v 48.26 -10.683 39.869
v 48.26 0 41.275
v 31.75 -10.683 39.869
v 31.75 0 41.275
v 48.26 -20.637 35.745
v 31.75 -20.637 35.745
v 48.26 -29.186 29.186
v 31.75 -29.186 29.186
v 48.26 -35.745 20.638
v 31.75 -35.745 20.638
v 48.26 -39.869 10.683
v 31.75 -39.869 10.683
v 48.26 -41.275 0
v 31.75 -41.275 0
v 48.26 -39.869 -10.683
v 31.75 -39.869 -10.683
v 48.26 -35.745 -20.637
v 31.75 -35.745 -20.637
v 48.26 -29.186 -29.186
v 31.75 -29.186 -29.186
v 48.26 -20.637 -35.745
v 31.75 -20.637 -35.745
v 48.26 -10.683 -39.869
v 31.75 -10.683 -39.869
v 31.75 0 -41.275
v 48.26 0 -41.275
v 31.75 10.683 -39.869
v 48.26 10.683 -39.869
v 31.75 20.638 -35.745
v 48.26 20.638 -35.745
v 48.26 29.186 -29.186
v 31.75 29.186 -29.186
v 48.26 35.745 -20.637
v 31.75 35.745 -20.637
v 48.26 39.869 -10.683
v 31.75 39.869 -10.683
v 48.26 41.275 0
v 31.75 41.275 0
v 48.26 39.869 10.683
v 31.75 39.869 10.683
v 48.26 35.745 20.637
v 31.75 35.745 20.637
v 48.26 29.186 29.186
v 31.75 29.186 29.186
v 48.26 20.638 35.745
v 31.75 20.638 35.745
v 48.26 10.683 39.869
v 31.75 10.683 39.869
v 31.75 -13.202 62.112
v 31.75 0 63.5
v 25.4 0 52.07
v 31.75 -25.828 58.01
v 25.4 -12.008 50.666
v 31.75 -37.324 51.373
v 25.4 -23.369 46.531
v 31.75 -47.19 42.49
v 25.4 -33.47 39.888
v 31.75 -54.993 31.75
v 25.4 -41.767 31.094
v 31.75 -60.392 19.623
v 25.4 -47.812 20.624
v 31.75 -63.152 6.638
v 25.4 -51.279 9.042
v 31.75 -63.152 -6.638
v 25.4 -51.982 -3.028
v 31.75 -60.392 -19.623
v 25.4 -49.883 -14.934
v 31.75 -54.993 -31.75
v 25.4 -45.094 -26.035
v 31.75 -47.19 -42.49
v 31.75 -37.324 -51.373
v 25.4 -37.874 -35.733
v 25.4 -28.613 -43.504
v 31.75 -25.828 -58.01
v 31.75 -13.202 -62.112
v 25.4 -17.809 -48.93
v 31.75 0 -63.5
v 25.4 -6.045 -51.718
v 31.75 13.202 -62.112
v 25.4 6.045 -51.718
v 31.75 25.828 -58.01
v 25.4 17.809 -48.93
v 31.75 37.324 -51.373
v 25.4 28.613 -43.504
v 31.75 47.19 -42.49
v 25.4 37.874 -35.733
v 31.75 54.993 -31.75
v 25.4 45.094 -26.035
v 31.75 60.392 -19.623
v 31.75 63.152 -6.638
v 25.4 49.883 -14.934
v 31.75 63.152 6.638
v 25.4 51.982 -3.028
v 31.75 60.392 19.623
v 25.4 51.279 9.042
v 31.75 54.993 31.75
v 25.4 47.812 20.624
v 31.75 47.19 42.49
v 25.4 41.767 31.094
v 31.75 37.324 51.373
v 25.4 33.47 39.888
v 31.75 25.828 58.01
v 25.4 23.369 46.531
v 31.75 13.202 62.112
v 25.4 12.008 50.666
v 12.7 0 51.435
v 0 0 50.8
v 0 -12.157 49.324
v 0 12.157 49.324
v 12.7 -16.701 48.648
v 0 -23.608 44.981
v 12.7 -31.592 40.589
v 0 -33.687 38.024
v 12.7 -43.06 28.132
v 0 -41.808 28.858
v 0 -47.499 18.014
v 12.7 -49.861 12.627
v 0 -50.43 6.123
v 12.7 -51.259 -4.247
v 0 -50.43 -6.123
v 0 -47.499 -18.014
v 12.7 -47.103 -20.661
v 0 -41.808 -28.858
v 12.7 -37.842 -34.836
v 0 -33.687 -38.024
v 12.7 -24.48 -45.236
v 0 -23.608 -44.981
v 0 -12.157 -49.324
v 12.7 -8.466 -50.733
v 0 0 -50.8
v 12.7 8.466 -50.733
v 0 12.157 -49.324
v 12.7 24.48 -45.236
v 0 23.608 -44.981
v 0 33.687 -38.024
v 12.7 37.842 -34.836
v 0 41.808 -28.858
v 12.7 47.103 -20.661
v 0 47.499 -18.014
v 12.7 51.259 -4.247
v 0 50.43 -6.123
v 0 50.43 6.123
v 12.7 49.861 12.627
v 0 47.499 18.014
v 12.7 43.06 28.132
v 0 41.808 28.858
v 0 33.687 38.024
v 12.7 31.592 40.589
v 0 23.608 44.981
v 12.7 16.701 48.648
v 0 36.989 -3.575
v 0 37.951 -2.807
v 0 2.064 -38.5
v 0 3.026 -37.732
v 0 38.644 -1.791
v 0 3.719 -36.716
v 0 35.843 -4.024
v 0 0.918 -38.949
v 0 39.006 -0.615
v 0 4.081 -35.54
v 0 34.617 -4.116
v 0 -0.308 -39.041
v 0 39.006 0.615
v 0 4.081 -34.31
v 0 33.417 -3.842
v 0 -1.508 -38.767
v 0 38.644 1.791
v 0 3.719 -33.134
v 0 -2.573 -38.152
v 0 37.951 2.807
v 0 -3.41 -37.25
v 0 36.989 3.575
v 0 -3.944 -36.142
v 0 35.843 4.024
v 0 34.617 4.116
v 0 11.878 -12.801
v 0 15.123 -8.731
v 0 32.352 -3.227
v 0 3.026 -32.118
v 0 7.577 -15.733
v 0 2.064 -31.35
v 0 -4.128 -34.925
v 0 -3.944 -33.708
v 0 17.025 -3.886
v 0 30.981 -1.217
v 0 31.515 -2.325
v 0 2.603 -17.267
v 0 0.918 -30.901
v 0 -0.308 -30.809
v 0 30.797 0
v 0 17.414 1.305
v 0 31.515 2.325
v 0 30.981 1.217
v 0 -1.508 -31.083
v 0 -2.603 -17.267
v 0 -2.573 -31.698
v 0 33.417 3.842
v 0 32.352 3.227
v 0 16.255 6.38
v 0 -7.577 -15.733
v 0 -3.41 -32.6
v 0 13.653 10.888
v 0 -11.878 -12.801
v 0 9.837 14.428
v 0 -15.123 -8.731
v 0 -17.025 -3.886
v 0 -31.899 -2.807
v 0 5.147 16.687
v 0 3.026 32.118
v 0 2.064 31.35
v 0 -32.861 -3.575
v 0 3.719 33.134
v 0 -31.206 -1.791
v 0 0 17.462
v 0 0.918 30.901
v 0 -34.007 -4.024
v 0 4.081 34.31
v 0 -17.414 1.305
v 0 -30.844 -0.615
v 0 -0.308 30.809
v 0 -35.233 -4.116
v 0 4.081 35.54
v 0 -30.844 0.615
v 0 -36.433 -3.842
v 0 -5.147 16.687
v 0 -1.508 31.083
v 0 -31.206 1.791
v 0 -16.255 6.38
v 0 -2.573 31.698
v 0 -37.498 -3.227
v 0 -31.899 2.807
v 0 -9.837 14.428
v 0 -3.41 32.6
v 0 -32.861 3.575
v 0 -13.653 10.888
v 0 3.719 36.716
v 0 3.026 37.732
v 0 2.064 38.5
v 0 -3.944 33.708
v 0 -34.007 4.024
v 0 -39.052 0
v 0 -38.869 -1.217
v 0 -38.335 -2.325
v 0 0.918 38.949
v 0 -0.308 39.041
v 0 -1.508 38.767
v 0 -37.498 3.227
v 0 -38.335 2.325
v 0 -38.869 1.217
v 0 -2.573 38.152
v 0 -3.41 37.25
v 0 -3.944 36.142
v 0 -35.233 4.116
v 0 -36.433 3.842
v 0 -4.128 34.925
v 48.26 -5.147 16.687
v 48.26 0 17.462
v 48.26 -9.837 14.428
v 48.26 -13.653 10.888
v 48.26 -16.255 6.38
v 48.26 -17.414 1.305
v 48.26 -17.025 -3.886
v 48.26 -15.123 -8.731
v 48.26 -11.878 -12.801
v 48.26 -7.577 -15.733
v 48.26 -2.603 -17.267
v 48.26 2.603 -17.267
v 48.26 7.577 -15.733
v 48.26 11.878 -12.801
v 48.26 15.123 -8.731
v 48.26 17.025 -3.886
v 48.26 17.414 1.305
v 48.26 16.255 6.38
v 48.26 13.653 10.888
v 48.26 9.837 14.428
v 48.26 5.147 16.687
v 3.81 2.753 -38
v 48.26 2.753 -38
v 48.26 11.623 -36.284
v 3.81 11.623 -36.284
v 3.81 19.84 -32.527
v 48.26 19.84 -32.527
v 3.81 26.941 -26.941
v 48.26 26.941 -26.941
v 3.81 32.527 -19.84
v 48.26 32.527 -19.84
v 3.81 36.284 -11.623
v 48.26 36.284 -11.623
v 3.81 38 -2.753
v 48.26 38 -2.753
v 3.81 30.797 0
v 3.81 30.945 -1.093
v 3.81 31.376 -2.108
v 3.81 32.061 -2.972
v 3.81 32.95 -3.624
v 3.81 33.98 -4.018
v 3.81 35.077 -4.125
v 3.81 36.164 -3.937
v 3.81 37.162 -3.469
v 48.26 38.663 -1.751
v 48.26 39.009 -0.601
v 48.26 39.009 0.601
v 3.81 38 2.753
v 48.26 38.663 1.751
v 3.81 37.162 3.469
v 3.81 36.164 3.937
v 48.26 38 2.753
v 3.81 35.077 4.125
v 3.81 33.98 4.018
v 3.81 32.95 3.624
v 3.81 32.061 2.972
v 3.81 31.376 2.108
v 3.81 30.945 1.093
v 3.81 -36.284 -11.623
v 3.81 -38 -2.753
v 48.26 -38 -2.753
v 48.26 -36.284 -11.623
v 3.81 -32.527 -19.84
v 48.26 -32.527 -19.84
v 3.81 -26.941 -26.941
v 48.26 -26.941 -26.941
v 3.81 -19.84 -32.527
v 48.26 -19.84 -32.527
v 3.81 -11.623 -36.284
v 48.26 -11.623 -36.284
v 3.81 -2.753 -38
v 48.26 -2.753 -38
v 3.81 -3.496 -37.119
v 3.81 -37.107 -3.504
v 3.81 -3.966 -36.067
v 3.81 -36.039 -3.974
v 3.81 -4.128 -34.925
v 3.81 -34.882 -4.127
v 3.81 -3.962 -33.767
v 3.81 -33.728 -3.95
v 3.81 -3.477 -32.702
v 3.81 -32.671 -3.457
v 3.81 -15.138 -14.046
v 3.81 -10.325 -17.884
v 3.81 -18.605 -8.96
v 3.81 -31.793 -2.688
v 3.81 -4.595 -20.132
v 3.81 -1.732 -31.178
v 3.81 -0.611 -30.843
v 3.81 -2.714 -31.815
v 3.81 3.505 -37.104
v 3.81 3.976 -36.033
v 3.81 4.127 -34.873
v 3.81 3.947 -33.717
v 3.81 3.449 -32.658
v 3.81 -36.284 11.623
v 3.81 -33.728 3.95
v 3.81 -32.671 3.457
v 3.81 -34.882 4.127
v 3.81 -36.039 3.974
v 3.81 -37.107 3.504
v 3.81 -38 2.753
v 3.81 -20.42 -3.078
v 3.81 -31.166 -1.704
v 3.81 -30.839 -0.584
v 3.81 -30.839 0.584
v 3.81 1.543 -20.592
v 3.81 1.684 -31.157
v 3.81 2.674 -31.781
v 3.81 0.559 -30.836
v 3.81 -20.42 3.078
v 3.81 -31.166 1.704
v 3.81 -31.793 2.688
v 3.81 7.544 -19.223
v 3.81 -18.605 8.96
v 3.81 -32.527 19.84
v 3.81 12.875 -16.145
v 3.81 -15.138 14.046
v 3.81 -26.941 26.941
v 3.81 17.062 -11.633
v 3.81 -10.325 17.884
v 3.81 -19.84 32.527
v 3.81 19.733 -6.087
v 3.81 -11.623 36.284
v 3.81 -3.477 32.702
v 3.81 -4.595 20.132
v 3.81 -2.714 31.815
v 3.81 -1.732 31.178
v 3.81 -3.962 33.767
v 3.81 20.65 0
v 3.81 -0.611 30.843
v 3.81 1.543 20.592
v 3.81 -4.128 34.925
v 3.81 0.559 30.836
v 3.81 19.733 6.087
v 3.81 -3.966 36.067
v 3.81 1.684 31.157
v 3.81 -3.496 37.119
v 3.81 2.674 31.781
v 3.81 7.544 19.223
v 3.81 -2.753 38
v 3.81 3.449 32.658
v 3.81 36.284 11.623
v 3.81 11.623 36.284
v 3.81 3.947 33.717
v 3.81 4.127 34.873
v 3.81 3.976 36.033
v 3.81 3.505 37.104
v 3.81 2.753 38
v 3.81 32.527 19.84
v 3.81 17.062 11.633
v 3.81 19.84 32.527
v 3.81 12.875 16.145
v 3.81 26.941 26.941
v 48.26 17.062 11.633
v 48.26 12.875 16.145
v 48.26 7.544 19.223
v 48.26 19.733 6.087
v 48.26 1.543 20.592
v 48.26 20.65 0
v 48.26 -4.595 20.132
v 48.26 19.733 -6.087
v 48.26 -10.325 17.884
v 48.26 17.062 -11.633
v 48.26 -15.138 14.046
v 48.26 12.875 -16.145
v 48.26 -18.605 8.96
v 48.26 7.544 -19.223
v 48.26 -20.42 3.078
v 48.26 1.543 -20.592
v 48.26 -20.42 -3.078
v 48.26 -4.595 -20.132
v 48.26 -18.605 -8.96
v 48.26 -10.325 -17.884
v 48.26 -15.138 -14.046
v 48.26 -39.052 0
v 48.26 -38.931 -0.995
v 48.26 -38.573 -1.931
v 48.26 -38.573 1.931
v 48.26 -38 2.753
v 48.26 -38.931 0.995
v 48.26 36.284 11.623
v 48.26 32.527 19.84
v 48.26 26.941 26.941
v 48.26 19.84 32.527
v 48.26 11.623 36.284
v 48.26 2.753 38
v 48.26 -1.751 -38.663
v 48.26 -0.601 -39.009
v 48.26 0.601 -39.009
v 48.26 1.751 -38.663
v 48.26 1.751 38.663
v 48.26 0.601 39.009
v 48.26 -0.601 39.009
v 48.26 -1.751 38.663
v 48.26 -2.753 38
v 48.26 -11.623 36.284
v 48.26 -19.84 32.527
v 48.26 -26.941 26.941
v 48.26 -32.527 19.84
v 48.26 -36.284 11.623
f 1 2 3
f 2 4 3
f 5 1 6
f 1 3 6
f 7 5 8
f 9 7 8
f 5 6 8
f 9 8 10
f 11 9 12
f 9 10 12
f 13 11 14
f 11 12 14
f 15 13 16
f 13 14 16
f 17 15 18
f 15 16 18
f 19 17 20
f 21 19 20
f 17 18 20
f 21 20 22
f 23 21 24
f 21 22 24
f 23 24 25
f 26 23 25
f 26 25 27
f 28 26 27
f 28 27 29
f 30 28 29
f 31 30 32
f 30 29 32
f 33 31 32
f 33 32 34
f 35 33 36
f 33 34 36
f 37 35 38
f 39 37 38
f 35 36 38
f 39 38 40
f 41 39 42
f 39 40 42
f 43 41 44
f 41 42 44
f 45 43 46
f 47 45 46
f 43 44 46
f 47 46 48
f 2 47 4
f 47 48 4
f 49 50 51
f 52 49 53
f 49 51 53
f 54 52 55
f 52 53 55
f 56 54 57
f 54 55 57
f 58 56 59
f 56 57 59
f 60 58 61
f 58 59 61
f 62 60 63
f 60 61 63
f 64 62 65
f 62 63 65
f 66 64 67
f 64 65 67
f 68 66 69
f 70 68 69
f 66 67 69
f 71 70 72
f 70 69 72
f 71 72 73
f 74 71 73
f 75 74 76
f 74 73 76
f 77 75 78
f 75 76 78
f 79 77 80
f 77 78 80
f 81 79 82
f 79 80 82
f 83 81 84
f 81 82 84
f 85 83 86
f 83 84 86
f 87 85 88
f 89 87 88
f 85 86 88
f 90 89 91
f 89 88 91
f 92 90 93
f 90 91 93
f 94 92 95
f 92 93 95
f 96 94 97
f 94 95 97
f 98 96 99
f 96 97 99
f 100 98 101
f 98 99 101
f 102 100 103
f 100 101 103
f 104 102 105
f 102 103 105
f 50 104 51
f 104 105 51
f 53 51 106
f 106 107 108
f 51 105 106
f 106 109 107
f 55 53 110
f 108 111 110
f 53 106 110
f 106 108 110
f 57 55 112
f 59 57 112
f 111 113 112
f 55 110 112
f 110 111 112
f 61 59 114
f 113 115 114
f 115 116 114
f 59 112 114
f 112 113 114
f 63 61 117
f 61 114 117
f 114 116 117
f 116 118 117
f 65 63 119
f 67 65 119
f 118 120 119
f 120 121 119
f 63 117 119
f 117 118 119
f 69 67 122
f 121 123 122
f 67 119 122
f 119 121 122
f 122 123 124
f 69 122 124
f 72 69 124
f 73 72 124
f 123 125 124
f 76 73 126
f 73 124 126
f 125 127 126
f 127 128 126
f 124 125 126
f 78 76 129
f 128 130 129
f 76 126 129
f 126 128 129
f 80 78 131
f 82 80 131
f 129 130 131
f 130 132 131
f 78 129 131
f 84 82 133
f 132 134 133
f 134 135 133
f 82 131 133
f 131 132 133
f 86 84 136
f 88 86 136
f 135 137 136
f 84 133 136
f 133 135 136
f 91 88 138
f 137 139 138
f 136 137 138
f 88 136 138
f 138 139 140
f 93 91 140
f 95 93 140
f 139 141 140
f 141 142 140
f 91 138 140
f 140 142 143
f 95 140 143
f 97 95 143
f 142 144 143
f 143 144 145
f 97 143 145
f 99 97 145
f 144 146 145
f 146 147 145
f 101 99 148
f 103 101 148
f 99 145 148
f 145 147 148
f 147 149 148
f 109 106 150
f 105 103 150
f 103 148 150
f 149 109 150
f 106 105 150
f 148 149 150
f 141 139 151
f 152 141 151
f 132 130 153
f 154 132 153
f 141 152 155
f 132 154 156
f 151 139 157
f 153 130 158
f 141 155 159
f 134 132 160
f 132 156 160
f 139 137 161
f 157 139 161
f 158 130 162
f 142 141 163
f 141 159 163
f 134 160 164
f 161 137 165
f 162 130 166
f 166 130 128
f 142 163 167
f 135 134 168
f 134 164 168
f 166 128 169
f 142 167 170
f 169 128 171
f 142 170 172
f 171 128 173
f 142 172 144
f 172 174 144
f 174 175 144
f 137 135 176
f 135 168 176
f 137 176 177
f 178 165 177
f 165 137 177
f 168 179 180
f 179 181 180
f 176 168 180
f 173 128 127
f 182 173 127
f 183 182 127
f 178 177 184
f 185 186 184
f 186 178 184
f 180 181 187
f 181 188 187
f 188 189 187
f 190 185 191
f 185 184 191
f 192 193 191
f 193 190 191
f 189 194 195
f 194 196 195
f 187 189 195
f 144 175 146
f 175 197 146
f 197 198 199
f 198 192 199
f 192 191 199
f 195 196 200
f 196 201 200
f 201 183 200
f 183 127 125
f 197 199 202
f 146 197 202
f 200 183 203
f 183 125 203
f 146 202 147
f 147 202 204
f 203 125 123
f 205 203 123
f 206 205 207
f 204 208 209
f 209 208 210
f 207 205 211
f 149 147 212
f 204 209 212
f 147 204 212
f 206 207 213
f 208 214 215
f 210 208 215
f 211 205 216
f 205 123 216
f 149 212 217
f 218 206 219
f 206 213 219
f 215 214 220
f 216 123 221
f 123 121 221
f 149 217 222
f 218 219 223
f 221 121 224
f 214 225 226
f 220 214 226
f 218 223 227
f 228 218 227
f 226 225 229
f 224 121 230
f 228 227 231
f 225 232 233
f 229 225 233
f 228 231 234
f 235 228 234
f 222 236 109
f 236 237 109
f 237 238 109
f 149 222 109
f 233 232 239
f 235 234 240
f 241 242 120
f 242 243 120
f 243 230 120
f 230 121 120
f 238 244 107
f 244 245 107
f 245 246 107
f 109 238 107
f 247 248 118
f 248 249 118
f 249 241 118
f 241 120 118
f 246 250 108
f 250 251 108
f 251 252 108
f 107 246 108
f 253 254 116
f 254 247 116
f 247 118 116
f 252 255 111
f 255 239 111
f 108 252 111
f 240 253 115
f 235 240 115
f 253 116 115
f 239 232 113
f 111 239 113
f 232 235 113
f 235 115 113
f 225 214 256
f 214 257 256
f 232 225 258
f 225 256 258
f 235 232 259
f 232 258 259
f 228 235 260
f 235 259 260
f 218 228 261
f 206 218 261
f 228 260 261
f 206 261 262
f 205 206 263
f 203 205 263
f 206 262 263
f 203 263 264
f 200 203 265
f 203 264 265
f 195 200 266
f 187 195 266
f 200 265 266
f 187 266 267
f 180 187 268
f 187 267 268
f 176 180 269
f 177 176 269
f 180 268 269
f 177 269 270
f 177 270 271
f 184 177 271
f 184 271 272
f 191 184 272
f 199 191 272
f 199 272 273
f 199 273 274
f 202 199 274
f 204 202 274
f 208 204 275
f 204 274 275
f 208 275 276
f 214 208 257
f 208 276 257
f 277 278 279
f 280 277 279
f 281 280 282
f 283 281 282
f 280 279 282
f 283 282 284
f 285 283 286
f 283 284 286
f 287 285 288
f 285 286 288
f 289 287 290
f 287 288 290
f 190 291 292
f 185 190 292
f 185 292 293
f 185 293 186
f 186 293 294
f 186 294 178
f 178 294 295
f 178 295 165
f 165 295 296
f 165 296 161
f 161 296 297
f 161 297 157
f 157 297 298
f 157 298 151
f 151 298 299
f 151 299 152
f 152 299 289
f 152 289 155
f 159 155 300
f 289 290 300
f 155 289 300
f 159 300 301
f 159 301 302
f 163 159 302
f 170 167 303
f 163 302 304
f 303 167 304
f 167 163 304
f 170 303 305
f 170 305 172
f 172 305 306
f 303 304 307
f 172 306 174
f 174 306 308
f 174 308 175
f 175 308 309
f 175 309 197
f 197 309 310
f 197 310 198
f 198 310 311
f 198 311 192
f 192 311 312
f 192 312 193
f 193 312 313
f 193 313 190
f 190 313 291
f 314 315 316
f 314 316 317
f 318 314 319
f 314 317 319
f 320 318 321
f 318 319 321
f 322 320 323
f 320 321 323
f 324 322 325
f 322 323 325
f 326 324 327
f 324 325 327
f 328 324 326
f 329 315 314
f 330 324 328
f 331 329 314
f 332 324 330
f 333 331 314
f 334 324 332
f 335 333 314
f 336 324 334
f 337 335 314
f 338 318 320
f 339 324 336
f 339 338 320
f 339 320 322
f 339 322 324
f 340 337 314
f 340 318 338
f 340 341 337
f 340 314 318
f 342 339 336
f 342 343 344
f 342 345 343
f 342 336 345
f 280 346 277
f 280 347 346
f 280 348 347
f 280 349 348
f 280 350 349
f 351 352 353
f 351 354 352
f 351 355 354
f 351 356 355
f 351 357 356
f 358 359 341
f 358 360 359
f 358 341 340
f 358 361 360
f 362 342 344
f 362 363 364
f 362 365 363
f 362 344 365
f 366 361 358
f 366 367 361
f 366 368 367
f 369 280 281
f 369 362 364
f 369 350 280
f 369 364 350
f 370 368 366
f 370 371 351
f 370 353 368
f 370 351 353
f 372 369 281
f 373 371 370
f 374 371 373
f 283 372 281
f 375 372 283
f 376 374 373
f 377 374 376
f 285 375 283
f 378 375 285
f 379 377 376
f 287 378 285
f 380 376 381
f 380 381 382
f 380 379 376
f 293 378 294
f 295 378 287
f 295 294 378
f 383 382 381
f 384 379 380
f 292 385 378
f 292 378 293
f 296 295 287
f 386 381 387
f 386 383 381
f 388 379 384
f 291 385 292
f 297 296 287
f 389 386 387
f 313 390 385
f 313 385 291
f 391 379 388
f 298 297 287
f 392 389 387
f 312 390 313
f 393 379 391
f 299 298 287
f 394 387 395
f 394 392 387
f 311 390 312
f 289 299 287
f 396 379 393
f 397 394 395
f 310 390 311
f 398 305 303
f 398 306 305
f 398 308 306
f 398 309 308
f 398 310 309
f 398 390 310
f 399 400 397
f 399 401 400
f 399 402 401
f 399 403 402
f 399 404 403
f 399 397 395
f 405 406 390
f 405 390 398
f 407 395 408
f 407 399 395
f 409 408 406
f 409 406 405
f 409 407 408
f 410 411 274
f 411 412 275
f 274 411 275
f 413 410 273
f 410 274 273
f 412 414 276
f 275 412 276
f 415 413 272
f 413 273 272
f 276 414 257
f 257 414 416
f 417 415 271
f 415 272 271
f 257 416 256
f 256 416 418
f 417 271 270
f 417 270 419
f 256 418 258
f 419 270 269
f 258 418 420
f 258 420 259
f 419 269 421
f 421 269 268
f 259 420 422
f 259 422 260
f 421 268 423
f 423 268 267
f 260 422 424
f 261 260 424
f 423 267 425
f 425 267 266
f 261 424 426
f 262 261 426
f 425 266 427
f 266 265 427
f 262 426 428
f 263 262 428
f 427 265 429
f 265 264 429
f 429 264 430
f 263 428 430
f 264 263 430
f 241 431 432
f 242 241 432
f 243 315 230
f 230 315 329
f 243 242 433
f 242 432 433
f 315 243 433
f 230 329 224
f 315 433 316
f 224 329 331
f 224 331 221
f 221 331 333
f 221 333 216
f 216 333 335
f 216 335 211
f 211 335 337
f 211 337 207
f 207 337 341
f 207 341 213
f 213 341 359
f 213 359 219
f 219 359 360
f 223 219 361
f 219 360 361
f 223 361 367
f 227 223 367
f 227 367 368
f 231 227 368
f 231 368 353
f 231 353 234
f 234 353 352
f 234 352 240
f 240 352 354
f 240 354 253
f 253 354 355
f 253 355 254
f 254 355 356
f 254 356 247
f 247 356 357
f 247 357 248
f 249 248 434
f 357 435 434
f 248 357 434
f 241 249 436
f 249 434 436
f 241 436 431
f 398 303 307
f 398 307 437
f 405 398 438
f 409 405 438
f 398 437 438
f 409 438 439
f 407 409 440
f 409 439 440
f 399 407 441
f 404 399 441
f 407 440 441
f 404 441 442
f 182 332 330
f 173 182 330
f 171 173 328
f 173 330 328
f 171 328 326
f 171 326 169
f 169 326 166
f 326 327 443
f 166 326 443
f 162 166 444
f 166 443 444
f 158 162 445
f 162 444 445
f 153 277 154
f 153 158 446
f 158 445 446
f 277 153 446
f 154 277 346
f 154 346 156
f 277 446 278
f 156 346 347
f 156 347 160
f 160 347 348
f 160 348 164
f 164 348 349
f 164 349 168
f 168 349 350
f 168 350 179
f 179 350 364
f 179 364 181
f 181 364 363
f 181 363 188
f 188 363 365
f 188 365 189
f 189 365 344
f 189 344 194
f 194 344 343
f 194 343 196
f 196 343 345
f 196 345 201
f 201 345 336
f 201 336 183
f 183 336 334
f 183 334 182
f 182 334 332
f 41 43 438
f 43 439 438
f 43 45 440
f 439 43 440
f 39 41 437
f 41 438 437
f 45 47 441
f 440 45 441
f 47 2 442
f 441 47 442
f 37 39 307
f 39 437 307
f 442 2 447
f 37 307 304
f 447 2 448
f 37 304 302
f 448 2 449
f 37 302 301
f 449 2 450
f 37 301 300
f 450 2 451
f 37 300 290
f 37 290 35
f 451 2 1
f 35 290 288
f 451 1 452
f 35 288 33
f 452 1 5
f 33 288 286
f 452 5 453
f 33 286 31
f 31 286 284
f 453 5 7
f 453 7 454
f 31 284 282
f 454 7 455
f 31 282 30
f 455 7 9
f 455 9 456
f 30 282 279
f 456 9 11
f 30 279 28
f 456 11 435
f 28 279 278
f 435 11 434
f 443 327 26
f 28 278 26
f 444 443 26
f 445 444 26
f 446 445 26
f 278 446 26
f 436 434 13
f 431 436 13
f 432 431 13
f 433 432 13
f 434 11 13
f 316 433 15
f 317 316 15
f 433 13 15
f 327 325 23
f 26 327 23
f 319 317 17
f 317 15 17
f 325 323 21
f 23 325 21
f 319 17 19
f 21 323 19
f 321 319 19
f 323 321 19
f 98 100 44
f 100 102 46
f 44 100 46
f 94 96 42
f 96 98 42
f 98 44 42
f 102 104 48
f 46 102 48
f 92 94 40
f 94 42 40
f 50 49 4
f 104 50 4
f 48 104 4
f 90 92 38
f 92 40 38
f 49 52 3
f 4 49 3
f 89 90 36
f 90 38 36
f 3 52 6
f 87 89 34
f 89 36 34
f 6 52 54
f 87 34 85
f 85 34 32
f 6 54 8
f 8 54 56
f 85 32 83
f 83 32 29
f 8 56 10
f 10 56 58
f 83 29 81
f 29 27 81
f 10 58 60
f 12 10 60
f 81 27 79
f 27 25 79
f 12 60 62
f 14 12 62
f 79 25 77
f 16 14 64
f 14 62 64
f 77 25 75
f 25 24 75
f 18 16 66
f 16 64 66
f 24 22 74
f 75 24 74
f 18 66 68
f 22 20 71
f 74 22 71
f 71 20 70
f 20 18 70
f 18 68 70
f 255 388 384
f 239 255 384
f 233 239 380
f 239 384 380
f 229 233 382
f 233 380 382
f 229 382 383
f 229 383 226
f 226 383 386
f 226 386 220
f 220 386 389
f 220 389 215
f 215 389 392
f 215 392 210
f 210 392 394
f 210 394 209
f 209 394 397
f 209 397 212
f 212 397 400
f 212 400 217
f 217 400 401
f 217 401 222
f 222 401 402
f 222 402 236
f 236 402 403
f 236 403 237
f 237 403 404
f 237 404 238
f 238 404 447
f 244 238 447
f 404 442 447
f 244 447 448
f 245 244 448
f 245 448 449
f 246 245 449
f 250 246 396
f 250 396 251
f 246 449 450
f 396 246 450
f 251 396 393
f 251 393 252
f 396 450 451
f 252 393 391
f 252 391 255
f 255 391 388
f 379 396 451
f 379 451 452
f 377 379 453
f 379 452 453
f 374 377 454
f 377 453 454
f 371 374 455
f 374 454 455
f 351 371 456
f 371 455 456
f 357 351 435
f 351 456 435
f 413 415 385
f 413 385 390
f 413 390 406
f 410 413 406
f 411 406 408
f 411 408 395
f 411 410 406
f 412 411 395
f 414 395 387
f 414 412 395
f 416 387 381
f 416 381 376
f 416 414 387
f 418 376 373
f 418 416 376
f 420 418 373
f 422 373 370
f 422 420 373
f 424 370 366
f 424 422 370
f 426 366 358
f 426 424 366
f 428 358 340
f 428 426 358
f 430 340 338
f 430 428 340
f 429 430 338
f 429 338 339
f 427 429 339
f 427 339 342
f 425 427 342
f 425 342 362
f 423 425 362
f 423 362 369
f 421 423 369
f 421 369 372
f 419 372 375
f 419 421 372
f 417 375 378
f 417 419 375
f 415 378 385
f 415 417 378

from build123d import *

# Parameters (mm, degrees)
F2_R     = 38.1
F2_R_2   = 20.6502
F3_DEPTH = 44.45
F5_D     = 8.255


with BuildPart() as f1:
    # F0 (on Front) → F1 (revolve)
    with BuildSketch(Plane.XZ):
        Polygon((0, 50.8), (0, 17.4625), (48.26, 17.4625), (48.26, 41.275), (31.75, 41.275), (31.75, 63.5), (25.4, 52.07), align=None)
    revolve(axis=Axis((41.694678, 0, 0), (1, 0, 0)))

    # F2 (on face) → F3 (cut)
    with BuildSketch(Plane.YZ.offset(48.26)):
        Circle(F2_R)
        Circle(F2_R_2, mode=Mode.SUBTRACT)
    extrude(amount=-F3_DEPTH, mode=Mode.SUBTRACT)

    # F5 (through all)
    with Locations(Plane(origin=(0, 0, 0), x_dir=(0, 1, 0), z_dir=(-1, 0, 0))):
        with Locations((-34.925, 0), (0, -34.925), (34.925, 0), (0, 34.925)):
            Hole(F5_D / 2)


solid = f1.part
